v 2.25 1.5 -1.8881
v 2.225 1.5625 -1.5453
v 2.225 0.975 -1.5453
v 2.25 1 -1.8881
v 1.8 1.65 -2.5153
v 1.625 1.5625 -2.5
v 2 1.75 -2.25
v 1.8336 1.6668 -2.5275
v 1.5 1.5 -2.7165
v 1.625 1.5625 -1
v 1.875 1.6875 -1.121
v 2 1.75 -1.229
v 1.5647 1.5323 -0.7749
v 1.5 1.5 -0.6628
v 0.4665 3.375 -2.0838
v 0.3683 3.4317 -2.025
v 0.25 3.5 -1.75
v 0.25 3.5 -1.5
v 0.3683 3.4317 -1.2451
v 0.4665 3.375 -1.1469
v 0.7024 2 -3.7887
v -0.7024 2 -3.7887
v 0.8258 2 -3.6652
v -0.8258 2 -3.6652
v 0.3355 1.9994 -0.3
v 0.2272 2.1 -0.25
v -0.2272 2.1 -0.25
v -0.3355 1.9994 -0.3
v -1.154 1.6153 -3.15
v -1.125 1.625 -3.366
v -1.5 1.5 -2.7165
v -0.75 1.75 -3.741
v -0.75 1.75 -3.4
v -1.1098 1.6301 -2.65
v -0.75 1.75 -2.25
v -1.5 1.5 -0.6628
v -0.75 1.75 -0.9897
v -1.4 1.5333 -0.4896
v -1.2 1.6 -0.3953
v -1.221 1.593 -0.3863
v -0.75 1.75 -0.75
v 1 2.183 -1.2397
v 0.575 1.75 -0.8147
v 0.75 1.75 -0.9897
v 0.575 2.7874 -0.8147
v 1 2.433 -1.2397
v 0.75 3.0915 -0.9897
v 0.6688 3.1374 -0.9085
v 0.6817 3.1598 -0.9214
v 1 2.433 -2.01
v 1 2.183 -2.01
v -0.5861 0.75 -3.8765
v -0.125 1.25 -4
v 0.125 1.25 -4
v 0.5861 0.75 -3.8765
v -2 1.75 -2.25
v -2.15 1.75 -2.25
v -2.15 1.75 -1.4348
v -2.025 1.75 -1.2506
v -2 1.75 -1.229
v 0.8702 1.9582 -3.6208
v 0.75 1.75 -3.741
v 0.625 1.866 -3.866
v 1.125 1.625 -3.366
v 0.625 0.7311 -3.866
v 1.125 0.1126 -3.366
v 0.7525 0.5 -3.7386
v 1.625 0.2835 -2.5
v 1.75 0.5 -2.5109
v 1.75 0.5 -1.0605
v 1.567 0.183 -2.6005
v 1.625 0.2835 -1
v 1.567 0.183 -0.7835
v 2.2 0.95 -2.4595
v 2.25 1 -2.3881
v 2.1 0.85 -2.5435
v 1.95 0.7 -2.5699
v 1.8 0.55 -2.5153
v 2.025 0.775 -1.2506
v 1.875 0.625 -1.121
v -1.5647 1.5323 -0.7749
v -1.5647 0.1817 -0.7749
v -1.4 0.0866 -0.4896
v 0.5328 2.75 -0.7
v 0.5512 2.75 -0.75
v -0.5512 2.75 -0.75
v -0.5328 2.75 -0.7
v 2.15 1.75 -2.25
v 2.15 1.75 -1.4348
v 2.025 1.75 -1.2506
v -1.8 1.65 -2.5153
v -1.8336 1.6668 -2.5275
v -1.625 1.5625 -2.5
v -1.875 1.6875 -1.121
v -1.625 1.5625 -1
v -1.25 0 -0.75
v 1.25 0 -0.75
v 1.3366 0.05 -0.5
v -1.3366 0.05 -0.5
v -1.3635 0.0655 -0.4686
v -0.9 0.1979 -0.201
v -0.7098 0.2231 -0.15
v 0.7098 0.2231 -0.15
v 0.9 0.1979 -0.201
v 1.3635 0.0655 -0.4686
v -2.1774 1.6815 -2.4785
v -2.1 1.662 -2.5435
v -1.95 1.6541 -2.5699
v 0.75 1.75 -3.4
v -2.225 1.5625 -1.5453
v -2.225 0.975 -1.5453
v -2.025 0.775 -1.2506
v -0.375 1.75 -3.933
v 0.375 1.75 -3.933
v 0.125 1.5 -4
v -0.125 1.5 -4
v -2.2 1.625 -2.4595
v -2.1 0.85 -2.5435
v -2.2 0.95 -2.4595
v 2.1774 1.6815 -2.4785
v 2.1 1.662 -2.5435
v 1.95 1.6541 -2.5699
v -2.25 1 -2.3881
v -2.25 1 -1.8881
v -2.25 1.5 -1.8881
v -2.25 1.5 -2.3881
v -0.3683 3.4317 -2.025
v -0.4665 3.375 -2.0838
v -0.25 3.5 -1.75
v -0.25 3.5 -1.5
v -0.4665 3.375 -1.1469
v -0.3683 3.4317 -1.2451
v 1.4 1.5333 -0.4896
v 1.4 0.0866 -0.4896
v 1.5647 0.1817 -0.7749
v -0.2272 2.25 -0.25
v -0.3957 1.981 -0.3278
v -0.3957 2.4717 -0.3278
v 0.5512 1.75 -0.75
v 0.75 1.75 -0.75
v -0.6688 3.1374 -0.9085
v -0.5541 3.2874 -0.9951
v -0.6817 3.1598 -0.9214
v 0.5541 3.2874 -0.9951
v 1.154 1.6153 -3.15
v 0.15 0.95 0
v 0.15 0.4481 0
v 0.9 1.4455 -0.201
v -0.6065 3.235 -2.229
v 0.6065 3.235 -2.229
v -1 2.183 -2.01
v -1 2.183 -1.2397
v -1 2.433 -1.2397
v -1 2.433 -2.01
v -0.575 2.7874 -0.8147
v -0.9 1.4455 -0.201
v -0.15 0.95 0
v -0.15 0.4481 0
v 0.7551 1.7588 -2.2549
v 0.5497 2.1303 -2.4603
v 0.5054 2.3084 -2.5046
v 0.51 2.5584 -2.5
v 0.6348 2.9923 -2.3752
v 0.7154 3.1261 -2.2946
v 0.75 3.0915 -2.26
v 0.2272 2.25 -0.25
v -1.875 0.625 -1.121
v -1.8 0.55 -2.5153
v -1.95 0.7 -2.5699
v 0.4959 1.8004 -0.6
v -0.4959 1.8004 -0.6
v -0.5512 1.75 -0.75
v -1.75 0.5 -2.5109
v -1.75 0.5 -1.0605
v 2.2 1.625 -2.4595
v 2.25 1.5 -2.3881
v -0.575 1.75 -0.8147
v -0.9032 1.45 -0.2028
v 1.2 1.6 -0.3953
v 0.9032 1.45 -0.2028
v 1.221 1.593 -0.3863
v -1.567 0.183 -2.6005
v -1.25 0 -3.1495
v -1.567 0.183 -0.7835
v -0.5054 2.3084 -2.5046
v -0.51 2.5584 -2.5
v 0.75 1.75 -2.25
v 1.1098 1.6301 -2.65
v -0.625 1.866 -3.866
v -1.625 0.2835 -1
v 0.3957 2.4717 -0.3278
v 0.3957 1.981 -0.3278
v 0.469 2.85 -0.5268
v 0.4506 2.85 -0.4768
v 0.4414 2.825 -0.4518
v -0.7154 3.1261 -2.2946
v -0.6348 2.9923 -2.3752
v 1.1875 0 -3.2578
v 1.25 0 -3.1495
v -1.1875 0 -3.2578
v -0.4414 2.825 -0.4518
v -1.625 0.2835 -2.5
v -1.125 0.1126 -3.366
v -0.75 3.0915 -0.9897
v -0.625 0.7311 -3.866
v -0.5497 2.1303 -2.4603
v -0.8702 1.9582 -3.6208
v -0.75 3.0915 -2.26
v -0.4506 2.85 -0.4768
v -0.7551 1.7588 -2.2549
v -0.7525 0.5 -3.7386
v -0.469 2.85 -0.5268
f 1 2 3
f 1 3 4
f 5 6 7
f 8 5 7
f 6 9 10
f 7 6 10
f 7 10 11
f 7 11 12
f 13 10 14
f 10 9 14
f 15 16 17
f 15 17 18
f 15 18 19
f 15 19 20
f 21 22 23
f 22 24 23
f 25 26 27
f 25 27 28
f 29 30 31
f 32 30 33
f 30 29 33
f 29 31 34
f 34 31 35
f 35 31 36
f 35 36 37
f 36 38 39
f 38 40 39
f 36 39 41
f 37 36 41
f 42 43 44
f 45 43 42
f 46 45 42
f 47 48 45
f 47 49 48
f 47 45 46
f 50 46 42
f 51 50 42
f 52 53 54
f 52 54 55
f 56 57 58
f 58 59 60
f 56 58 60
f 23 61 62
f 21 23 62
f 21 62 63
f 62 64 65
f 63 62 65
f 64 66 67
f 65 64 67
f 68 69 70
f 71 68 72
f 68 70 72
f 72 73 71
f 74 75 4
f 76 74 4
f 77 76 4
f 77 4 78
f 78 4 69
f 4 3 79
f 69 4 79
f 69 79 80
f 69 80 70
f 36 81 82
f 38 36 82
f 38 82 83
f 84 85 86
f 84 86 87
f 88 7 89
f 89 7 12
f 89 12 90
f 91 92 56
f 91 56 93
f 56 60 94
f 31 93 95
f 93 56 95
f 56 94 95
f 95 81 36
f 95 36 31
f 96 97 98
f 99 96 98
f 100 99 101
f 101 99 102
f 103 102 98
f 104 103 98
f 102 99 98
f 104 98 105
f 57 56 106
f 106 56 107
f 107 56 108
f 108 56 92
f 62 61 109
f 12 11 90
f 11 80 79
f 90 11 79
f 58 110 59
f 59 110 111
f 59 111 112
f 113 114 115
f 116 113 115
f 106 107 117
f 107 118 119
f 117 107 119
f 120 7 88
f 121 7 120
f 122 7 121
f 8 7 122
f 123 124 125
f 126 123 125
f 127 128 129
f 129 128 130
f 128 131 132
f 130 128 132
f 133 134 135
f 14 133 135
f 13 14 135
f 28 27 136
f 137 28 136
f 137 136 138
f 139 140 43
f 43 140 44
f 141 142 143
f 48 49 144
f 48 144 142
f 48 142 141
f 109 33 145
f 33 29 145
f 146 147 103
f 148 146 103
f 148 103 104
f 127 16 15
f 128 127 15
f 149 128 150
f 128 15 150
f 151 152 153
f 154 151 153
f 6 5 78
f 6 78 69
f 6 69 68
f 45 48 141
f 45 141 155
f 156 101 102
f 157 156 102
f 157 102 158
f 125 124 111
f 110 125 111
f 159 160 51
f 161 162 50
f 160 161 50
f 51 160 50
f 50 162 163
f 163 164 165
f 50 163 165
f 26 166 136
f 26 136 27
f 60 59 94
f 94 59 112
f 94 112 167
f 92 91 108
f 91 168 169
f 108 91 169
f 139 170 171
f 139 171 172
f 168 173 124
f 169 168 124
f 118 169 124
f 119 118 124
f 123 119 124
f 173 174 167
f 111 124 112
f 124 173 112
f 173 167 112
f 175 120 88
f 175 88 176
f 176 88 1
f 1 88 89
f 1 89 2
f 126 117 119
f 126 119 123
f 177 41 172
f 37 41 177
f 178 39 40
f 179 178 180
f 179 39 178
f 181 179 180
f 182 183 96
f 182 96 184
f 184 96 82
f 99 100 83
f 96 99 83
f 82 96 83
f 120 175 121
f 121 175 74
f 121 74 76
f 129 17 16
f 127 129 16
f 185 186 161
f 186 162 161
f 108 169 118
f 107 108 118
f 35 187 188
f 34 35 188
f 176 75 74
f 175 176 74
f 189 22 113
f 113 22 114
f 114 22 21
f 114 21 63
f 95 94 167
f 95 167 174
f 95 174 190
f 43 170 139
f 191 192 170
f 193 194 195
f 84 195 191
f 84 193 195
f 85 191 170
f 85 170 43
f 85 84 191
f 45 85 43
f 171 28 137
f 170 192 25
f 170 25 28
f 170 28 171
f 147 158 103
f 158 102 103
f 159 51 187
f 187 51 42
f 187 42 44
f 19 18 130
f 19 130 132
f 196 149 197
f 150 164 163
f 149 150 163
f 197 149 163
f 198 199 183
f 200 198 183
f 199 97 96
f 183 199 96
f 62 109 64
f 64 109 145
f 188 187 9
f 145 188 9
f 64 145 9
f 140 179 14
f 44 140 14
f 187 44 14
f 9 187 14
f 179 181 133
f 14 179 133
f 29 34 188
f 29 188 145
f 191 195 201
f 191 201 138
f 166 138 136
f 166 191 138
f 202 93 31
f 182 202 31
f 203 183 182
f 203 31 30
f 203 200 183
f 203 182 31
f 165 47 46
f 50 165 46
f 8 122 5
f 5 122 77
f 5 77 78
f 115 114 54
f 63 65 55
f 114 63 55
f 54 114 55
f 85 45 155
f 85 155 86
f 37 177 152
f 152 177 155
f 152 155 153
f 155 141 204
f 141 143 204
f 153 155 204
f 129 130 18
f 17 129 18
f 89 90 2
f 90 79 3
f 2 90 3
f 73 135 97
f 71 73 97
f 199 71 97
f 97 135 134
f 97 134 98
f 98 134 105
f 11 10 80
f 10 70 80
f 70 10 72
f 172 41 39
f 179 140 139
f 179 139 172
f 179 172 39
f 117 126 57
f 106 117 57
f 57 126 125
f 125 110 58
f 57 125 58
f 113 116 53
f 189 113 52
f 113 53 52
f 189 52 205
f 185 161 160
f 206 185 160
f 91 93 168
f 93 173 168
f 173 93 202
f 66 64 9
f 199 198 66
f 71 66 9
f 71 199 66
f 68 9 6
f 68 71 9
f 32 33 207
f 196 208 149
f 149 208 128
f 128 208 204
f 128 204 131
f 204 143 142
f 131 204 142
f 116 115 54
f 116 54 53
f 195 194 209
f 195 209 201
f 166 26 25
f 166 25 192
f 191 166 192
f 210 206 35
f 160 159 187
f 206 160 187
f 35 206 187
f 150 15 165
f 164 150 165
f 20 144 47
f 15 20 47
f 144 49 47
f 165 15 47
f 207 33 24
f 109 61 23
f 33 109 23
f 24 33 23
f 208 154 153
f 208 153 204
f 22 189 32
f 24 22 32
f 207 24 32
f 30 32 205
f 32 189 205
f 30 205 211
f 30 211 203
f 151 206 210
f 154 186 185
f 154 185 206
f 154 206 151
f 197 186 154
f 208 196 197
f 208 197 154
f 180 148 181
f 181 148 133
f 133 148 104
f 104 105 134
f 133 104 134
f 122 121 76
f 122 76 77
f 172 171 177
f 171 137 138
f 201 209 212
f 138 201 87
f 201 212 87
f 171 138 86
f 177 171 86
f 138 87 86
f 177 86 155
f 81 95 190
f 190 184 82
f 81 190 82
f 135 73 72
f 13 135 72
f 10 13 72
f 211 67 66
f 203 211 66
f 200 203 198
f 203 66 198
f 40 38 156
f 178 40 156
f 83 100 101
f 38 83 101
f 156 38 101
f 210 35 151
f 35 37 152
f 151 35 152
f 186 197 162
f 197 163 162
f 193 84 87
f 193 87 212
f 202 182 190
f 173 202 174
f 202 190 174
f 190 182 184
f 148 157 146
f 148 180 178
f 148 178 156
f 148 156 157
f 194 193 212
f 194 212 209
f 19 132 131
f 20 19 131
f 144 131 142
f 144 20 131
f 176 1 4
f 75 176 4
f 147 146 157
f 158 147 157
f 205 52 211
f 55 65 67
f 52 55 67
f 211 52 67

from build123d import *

# Parameters (mm, degrees)
BOSS_EXTRUDE1_DEPTH     = 4
CUT_EXTRUDE2_DEPTH      = 4.5
CUT_EXTRUDE2_DEPTH_BACK = 1
CUT_EXTRUDE3_DEPTH      = 3.25
CUT_EXTRUDE3_DEPTH_BACK = 3.25
CUT_EXTRUDE4_DEPTH      = 1.75


with BuildPart() as part:
    # Sketch1 → Boss-Extrude1 (new body)
    with BuildSketch(Plane.XY):
        Polygon((1.25, 0), (-1.25, 0), (-1.566987298, 0.183012702), (-1.75, 0.5), (-2.25, 1), (-2.25, 1.5), (-2.15, 1.75), (-2, 1.75), (-1.5, 1.5), (-0.75, 1.75), (-1, 2.183012702), (-1, 2.433012702), (-0.75, 3.091506351), (-0.466506351, 3.375), (-0.25, 3.5), (0.25, 3.5), (0.466506351, 3.375), (0.75, 3.091506351), (1, 2.433012702), (1, 2.183012702), (0.75, 1.75), (1.5, 1.5), (2, 1.75), (2.15, 1.75), (2.25, 1.5), (2.25, 1), (1.75, 0.5), (1.566987298, 0.183012702), align=None)
    extrude(amount=-BOSS_EXTRUDE1_DEPTH)

    # Sketch2 → Cut-Extrude2 (cut, two sides)
    with BuildSketch(Plane(origin=(0, 0, 0), x_dir=(1, 0, 0), z_dir=(0, 1, 0))) as cut_extrude2_sk:
        Polygon((-2.25, 4), (-0.125, 4), (-0.625, 3.866025404), (-1.125, 3.366025404), (-1.375, 2.933012702), (-1.625, 2.5), (-1.8, 2.515310516), (-1.95, 2.569906051), (-2.1, 2.543457004), (-2.2, 2.459547041), (-2.25, 2.388139641), align=None)
        Polygon((2.25, 4), (2.25, 2.388139641), (2.2, 2.459547041), (2.1, 2.543457004), (1.95, 2.569906051), (1.8, 2.515310516), (1.625, 2.5), (1.375, 2.933012702), (1.125, 3.366025404), (0.625, 3.866025404), (0.125, 4), align=None)
        Polygon((2.25, 0), (0.15, 0), (0.9, 0.200961894), (1.4, 0.489637029), (1.56467423, 0.774861163), (1.625, 1), (1.875, 1.121015931), (2.025, 1.250629304), (2.225, 1.545251417), (2.25, 1.888139641), align=None)
        Polygon((-2.25, 0), (-2.25, 1.888139641), (-2.225, 1.545251417), (-2.025, 1.250629304), (-1.875, 1.121015931), (-1.625, 1), (-1.56467423, 0.774861163), (-1.4, 0.489637029), (-0.9, 0.200961894), (-0.15, 0), align=None)
    extrude(amount=CUT_EXTRUDE2_DEPTH, mode=Mode.SUBTRACT)
    extrude(cut_extrude2_sk.sketch, amount=-CUT_EXTRUDE2_DEPTH_BACK, mode=Mode.SUBTRACT)

    # Sketch3 → Cut-Extrude3 (cut, two sides)
    with BuildSketch(Plane(origin=(0, 0, 0), x_dir=(0, 0, -1), z_dir=(1, 0, 0))) as cut_extrude3_sk:
        Polygon((0.75, 0), (0.5, 0.05), (0.15, 0.223056275), (0, 0.448056275), (0, 0), align=None)
        Polygon((0.75, 1.75), (0.395308416, 1.6), (0.202788783, 1.45), (0, 0.95), (0, 3.5), (1.5, 3.5), (1.245096189, 3.43169873), (0.995096189, 3.287361163), (0.908493649, 3.137361163), (0.814711432, 2.787361163), (0.75, 2.75), (0.7, 2.75), (0.526794919, 2.85), (0.476794919, 2.85), (0.451794919, 2.825), (0.25, 2.25), (0.25, 2.1), (0.3, 1.999431174), (0.6, 1.800377785), align=None)
        Polygon((1.75, 3.5), (2.025, 3.43169873), (2.229006351, 3.235048095), (2.375164424, 2.992297439), (2.5, 2.55842438), (2.504589784, 2.30842438), (2.460345023, 2.13028261), (2.25, 1.75), (2.65, 1.63007538), (3.15, 1.615328853), (3.4, 1.75), (3.665194664, 2), (3.788675135, 2), (3.933012702, 1.75), (4, 1.5), (4, 3.5), align=None)
        Polygon((3.257772228, 0), (4, 0), (4, 1.25), (3.876460197, 0.75), (3.738574291, 0.5), align=None)
    extrude(amount=CUT_EXTRUDE3_DEPTH, mode=Mode.SUBTRACT)
    extrude(cut_extrude3_sk.sketch, amount=-CUT_EXTRUDE3_DEPTH_BACK, mode=Mode.SUBTRACT)

    # Sketch4 → Cut-Extrude4 (cut)
    with BuildSketch(Plane(origin=(0, 3.5, 0), x_dir=(1, 0, 0), z_dir=(0, 1, 0))):
        Polygon((1, 2.51), (0.5, 2.51), (1, 2.01), align=None)
        Polygon((-1, 2.51), (-0.5, 2.51), (-1, 2.01), align=None)
        Polygon((0.575, 0.814711432), (1, 1.239711432), (1, 0.202788783), (0.125, 0.202788783), (0.395706228, 0.327788783), align=None)
        Polygon((-0.575, 0.814711432), (-1, 1.239711432), (-1, 0.202788783), (-0.125, 0.202788783), (-0.395706228, 0.327788783), align=None)
    extrude(amount=-CUT_EXTRUDE4_DEPTH, mode=Mode.SUBTRACT)


solid = part.part
